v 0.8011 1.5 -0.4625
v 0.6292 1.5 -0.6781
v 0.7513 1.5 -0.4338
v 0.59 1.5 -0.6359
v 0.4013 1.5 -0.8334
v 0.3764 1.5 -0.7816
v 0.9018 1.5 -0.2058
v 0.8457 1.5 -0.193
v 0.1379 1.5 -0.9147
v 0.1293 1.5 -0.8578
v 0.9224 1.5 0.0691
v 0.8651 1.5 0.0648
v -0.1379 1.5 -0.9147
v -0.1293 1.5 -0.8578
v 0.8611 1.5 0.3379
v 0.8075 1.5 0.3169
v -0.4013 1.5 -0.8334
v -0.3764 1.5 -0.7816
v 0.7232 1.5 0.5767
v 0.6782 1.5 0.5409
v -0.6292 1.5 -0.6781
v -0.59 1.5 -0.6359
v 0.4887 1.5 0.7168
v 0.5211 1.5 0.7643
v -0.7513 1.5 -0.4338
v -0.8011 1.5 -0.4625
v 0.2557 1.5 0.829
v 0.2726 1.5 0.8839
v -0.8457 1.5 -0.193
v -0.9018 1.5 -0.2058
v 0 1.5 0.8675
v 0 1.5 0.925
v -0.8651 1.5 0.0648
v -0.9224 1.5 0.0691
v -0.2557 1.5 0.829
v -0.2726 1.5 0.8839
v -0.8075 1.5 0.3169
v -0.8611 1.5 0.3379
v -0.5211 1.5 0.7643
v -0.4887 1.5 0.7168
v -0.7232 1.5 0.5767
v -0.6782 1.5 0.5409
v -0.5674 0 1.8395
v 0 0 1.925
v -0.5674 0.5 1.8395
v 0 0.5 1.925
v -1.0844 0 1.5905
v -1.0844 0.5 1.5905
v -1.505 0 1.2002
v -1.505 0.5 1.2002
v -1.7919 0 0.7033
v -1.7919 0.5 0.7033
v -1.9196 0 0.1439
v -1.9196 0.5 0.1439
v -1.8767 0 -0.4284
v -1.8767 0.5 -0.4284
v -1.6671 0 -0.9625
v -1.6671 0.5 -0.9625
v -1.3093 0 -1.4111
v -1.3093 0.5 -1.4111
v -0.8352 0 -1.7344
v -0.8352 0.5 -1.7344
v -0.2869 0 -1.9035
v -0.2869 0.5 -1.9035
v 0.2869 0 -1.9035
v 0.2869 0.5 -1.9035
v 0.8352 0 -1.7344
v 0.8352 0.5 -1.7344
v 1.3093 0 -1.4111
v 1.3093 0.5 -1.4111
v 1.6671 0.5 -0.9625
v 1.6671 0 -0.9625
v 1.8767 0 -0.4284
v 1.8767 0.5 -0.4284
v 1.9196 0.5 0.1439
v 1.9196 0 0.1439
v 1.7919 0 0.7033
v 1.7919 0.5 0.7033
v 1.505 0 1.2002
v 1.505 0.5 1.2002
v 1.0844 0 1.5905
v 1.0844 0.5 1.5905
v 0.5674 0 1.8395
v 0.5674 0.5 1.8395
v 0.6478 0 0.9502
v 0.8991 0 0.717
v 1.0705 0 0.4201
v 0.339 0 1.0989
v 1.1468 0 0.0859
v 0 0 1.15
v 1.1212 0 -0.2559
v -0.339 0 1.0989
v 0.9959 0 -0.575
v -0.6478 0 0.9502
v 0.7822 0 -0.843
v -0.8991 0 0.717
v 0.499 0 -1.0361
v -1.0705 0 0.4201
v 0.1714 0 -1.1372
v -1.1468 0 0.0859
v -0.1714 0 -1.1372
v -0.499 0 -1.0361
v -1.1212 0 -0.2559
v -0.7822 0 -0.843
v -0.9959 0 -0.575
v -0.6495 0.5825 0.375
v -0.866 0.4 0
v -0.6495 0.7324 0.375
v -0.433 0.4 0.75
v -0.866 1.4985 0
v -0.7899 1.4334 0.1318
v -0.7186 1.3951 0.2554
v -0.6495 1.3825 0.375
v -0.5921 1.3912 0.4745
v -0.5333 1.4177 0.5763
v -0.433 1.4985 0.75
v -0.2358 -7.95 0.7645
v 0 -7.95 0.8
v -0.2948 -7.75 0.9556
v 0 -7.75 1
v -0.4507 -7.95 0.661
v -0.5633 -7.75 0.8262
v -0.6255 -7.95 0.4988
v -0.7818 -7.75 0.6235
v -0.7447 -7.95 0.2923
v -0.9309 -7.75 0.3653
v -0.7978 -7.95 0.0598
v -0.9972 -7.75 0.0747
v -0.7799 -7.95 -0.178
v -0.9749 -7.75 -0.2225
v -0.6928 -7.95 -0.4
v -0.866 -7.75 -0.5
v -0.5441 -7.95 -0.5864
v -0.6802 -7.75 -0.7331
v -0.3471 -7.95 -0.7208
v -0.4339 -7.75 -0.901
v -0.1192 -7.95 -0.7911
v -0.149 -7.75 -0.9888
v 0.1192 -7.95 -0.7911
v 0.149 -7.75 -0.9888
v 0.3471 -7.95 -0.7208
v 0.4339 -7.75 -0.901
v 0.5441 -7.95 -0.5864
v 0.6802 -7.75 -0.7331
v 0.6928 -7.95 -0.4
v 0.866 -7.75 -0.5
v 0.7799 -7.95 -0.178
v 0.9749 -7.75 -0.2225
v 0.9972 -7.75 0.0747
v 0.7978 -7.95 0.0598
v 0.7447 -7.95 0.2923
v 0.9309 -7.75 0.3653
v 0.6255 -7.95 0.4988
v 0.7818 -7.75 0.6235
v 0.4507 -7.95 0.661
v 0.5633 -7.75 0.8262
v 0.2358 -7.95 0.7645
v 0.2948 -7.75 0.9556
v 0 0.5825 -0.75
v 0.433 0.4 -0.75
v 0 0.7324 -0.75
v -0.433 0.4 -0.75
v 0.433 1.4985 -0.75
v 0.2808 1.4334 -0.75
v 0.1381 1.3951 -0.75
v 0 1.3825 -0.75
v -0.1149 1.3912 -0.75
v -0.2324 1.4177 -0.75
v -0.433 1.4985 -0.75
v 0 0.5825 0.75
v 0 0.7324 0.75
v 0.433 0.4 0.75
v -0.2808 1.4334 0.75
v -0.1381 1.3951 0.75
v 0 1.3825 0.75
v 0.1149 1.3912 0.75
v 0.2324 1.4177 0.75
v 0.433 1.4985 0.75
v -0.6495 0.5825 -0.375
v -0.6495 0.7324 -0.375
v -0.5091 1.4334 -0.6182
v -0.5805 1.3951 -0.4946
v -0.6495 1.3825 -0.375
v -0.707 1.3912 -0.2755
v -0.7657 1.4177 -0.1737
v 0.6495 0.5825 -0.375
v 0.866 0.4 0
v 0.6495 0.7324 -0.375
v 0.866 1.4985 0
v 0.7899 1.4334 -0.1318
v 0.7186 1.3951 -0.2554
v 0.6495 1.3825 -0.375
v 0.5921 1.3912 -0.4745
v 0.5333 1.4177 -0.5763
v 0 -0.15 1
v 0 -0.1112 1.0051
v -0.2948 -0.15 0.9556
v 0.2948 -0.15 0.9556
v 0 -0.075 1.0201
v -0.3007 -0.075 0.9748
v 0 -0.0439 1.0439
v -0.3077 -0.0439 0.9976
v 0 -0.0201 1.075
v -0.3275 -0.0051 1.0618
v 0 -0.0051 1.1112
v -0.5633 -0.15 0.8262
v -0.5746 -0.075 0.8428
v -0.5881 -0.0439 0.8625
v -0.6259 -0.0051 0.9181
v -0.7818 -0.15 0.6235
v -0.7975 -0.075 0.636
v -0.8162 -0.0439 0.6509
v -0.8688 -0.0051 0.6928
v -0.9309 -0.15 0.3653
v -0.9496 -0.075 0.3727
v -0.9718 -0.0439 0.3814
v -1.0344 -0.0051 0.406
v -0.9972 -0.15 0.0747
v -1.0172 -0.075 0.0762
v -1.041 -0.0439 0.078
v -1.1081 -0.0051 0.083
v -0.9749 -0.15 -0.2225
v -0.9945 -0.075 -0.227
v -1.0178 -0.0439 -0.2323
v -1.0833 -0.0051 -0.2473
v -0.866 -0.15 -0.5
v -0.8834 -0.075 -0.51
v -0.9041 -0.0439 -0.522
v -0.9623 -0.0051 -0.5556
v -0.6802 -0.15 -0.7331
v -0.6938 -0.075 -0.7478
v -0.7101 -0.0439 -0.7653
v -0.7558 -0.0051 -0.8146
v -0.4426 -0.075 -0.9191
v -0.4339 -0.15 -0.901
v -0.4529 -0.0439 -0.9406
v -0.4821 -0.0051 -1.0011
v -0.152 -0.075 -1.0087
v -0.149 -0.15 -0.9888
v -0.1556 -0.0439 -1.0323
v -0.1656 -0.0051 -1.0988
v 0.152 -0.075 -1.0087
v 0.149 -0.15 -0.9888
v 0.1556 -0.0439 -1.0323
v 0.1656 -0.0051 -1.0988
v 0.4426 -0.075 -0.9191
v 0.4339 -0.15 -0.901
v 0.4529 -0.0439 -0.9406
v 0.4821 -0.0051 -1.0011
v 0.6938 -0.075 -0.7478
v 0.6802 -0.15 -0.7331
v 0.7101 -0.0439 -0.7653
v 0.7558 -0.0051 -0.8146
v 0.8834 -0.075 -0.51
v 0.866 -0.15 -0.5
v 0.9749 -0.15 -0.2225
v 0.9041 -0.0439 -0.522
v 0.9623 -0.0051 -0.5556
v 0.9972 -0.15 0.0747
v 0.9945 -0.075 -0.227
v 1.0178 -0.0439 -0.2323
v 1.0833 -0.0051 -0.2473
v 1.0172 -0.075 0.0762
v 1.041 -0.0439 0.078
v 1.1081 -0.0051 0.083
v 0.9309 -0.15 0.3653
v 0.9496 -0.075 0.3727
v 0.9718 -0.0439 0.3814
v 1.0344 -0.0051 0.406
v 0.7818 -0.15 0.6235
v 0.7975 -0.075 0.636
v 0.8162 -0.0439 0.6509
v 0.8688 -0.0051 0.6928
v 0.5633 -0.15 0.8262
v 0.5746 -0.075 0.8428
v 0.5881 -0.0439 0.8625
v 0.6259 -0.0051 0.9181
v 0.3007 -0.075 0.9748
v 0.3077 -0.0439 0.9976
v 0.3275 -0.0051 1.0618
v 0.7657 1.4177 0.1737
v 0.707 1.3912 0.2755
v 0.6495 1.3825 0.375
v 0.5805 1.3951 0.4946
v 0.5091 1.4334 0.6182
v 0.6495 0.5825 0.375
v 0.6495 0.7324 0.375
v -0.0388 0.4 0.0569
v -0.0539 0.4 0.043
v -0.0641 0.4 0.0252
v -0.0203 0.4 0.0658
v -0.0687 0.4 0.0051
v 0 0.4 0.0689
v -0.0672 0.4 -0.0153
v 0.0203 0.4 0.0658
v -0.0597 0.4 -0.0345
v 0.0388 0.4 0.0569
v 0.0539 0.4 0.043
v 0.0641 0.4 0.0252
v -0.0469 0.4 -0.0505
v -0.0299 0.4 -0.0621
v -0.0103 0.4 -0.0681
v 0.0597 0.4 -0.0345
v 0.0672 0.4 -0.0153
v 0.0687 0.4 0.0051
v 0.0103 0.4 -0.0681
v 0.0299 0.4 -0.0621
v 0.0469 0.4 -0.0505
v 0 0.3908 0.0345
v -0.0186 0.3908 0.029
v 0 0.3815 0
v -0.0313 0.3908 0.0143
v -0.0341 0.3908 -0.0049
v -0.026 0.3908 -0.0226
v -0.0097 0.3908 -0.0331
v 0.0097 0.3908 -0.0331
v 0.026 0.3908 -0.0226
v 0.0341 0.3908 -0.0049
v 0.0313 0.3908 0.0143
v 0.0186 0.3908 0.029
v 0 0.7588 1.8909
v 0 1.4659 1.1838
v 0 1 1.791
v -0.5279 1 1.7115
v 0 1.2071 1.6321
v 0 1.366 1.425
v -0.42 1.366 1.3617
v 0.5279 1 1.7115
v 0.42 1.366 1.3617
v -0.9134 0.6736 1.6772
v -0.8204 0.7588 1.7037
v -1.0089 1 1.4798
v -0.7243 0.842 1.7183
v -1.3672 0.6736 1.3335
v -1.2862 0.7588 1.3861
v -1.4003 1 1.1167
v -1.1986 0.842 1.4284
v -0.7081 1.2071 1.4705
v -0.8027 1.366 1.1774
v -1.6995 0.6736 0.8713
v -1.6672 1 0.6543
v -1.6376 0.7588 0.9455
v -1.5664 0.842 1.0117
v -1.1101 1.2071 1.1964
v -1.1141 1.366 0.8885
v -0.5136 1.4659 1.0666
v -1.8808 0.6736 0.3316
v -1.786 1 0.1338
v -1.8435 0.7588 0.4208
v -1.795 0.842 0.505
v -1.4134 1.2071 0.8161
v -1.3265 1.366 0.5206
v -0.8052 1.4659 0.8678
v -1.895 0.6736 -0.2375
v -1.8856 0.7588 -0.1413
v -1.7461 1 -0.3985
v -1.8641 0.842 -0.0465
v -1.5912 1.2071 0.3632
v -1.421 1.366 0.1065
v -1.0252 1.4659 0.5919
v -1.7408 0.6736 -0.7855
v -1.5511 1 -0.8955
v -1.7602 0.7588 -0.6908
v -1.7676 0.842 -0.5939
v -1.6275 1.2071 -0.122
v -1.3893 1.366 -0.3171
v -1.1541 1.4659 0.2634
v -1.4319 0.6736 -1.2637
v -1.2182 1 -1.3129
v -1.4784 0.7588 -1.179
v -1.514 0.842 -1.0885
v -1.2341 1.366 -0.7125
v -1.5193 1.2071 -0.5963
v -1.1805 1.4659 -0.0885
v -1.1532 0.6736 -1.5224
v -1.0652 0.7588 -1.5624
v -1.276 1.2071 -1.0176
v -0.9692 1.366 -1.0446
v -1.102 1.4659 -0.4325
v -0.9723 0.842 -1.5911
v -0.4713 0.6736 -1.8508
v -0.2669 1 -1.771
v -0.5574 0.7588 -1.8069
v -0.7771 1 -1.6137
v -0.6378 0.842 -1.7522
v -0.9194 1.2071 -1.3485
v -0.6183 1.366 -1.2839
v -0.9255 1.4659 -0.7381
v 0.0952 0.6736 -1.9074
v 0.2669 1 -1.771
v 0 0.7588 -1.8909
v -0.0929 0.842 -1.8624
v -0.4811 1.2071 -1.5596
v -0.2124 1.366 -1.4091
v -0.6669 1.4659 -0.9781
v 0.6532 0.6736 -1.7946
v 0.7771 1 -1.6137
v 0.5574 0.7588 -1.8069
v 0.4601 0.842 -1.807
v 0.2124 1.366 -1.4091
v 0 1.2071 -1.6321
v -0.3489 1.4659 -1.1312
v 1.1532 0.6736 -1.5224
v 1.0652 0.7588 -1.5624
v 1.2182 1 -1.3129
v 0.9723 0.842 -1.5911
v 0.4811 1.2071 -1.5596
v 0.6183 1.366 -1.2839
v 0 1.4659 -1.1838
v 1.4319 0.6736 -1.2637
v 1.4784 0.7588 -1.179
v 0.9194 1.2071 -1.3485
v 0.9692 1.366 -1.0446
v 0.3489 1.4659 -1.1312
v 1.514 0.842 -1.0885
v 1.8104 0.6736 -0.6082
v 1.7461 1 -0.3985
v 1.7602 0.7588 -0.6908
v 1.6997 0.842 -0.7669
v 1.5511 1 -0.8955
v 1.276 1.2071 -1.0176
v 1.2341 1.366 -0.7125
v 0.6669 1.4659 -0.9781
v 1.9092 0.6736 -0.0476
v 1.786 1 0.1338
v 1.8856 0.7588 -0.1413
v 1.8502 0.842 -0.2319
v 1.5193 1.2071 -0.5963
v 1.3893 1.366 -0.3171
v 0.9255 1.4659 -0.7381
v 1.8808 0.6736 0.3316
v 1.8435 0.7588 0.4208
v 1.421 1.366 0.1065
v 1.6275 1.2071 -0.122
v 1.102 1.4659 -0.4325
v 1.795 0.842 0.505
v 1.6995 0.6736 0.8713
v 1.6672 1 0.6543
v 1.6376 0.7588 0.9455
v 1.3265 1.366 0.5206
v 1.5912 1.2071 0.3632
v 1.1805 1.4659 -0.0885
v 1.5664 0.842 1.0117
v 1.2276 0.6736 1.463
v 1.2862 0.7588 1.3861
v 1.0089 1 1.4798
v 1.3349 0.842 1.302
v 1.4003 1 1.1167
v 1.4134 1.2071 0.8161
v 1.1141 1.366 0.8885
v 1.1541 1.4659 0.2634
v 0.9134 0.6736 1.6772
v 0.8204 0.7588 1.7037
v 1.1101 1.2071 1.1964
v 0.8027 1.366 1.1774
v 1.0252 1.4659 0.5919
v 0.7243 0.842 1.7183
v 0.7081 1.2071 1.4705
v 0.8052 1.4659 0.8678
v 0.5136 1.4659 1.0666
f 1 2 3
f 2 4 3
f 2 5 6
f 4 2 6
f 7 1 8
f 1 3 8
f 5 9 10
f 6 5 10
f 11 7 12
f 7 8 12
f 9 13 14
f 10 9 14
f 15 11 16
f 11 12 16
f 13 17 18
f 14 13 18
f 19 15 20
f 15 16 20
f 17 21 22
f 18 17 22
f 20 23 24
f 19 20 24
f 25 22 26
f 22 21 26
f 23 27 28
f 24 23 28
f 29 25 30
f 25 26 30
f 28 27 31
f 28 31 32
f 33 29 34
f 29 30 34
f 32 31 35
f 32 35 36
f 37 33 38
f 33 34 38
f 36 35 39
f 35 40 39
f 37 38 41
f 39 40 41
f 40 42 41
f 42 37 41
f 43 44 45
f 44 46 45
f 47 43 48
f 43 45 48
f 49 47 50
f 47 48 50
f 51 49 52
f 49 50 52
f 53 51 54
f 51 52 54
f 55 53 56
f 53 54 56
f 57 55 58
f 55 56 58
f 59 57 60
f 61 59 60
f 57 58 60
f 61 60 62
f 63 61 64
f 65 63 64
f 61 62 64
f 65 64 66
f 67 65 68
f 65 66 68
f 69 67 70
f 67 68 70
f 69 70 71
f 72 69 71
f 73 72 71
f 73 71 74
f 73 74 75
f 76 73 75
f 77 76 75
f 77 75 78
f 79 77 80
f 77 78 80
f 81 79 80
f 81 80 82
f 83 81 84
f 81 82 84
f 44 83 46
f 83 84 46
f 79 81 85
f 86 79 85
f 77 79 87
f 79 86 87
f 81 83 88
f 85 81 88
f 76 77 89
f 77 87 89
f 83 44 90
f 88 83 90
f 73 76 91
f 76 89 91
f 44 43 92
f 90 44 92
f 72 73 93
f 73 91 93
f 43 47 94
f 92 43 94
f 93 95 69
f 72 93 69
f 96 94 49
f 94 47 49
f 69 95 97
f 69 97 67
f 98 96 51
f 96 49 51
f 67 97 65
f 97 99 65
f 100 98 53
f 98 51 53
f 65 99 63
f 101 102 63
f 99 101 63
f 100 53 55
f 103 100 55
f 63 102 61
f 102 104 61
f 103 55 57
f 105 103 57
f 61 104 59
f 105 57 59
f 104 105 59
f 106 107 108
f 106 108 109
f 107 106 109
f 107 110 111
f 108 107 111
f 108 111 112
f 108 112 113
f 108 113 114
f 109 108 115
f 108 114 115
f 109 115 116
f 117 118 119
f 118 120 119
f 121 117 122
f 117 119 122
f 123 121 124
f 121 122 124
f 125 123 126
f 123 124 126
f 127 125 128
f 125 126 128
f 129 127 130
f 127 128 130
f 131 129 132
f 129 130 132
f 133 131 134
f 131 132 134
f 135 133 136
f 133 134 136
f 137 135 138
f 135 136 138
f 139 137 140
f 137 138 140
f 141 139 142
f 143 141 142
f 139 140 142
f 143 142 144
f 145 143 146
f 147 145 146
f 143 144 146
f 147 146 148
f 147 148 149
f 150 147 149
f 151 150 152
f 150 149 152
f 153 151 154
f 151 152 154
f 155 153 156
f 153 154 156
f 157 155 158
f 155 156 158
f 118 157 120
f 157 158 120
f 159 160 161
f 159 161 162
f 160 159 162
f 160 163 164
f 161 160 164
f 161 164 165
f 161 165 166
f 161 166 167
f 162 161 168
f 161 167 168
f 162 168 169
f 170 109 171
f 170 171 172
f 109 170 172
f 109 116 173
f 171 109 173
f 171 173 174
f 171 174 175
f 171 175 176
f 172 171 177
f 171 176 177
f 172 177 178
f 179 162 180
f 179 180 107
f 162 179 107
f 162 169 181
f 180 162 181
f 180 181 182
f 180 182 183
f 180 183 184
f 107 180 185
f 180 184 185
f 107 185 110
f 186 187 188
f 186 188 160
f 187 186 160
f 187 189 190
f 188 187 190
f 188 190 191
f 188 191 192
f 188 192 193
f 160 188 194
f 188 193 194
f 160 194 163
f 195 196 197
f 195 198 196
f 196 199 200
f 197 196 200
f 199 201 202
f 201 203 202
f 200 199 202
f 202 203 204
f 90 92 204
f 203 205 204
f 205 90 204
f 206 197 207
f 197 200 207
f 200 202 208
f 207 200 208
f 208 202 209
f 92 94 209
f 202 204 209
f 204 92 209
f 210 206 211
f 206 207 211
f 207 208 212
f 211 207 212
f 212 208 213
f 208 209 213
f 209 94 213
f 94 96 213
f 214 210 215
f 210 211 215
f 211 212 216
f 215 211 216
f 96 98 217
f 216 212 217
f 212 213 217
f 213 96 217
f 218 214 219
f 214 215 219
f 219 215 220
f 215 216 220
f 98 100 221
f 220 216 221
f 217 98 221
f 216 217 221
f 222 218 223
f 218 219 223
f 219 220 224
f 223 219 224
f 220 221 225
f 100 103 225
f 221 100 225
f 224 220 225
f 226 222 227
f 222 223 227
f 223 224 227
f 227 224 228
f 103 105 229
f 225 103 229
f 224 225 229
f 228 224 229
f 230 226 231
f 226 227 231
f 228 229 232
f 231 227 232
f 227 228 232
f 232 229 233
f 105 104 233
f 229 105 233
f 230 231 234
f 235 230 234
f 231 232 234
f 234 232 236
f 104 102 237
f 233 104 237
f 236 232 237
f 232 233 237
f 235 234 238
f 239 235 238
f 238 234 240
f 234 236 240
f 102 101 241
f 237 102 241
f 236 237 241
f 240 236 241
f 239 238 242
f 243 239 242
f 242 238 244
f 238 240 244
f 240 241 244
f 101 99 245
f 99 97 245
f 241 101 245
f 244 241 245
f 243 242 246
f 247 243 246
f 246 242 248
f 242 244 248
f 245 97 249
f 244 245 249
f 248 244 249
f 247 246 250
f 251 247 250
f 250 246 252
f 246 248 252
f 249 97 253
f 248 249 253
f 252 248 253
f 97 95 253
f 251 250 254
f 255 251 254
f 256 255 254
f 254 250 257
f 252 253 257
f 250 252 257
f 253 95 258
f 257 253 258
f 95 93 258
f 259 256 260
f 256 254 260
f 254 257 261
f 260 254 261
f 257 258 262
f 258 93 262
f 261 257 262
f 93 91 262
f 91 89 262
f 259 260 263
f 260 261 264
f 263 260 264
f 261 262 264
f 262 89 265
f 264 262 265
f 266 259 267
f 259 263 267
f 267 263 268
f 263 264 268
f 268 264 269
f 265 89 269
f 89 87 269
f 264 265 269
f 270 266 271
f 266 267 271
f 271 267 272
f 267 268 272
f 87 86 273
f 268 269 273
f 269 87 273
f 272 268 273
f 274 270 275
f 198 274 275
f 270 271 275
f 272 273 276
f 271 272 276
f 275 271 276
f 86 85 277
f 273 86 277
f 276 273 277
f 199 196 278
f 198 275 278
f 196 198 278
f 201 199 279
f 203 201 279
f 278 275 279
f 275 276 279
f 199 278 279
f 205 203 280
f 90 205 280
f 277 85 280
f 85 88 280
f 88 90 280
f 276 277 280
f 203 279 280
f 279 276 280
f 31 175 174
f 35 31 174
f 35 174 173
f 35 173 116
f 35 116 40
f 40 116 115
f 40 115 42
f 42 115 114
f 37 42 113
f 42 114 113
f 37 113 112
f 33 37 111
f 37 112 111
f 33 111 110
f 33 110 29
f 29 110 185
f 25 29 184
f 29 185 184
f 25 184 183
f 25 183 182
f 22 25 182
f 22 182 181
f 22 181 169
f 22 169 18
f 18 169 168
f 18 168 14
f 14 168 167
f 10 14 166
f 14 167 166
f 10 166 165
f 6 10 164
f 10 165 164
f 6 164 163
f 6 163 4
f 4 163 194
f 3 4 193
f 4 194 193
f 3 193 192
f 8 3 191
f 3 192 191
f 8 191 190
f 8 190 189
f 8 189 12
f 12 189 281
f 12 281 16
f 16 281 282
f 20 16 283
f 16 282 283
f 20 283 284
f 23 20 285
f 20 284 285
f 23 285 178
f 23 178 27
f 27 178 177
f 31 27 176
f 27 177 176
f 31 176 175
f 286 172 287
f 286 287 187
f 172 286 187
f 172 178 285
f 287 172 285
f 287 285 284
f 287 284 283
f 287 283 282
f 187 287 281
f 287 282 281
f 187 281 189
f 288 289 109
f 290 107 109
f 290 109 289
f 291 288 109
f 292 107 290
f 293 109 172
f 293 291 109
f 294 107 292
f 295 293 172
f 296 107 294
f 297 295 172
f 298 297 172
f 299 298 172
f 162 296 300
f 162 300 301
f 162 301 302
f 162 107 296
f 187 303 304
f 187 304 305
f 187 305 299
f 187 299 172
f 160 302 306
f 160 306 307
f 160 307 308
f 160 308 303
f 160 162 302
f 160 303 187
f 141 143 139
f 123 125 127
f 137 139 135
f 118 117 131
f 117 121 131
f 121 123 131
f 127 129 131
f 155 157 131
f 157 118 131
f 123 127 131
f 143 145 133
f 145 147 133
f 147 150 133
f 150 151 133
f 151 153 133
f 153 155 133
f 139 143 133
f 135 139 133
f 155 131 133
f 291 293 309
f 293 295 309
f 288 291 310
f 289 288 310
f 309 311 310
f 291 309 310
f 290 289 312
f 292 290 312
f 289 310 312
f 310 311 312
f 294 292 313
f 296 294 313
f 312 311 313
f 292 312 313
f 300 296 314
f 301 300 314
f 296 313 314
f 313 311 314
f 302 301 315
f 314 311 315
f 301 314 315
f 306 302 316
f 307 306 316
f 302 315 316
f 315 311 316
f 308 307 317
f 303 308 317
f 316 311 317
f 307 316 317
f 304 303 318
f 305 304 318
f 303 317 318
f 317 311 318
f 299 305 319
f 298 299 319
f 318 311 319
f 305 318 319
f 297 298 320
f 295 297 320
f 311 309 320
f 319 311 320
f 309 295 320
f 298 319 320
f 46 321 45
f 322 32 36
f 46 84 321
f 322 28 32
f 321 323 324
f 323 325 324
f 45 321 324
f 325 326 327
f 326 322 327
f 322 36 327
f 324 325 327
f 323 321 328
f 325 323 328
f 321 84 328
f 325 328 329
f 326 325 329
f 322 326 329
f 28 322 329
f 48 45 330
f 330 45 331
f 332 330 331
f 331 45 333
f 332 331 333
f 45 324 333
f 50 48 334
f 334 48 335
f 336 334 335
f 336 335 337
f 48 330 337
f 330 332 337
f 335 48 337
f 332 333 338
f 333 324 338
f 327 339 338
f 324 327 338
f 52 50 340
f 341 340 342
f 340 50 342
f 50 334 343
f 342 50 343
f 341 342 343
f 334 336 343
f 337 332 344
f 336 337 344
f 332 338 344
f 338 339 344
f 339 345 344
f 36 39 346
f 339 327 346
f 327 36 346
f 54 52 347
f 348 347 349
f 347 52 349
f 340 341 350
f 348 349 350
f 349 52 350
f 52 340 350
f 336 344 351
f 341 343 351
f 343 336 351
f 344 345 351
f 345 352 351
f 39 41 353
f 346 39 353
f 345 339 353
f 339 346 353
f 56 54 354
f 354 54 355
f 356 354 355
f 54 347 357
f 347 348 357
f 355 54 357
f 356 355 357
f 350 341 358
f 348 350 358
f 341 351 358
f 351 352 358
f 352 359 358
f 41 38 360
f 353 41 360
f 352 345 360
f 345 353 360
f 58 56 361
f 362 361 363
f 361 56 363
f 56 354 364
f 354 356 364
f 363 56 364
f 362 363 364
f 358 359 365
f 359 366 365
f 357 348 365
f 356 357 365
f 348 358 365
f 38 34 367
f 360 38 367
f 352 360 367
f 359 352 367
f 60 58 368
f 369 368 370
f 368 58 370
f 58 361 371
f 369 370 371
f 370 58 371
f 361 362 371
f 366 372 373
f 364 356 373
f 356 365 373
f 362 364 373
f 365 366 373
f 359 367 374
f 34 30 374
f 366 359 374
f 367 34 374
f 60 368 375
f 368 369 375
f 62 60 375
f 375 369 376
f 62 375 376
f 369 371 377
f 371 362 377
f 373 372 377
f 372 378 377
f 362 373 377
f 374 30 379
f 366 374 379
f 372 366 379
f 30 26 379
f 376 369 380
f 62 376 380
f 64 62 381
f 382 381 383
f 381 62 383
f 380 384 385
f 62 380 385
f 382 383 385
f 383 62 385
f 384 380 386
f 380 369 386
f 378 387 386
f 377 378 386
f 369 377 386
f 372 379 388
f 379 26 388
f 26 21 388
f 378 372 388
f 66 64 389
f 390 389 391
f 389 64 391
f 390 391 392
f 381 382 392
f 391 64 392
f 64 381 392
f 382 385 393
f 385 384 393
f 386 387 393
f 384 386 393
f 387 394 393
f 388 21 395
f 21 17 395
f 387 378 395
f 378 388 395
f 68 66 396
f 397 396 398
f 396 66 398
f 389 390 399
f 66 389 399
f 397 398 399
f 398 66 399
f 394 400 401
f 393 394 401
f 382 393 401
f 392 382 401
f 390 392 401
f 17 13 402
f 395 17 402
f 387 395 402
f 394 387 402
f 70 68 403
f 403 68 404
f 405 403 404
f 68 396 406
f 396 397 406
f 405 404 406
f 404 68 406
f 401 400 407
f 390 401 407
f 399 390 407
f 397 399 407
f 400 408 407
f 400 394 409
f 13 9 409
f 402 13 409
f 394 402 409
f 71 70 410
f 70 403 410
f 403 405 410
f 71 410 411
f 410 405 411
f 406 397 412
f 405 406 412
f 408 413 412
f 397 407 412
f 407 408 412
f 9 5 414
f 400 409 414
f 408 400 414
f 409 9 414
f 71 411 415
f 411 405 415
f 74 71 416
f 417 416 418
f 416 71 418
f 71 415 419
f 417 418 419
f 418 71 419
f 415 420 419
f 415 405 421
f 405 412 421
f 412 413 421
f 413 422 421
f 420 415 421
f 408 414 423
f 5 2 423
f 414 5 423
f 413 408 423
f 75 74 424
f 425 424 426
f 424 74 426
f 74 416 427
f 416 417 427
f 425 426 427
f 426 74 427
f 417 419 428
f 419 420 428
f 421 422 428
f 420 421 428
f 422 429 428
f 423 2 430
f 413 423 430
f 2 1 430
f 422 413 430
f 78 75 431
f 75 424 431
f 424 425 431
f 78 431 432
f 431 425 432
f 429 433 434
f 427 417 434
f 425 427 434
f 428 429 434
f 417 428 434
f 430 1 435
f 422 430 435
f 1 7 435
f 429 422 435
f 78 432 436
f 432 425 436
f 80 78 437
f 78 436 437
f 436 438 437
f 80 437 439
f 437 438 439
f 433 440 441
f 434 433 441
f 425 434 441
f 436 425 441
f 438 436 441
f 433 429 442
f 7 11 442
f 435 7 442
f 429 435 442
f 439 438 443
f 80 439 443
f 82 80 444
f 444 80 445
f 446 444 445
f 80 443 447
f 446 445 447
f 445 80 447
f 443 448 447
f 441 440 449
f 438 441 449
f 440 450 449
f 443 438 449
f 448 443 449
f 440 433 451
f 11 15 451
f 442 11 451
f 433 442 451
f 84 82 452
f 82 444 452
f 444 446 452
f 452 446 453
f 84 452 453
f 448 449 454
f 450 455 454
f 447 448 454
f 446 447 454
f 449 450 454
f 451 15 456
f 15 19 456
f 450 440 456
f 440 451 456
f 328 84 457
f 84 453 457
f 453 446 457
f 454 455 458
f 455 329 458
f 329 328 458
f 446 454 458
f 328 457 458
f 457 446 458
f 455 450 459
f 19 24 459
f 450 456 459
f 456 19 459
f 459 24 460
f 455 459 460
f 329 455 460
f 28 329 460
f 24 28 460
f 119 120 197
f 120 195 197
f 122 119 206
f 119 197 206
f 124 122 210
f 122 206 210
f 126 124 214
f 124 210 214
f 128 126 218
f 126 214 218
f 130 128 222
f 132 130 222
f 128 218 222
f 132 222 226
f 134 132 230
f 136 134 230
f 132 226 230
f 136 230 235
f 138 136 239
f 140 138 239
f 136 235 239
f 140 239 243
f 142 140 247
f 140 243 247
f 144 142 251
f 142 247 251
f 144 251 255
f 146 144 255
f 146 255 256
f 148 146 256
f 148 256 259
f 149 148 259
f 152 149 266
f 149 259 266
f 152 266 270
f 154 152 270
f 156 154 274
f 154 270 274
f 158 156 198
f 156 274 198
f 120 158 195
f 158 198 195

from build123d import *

# Parameters (mm, degrees)
CUT_EXTRUDE1_DEPTH  = 1.1
BOSS_EXTRUDE1_REACH = 12.334
BOSS_EXTRUDE1_START = -0.5
SKETCH2_3_R         = 1.309481769


with BuildPart() as part:
    # Sketch1 → Revolve1 (revolve)
    with BuildSketch(Plane(origin=(0, 0, 0), x_dir=(0, 0, -1), z_dir=(1, 0, 0))):
        with BuildLine():
            Line((0, -7.95), (0.8, -7.95))
            Line((0.8, -7.95), (1, -7.75))
            Line((1, -7.75), (1, -0.15))
            ThreePointArc((1, -0.15), (1.043933983, -0.043933983), (1.15, 0))
            Line((1.15, 0), (1.925, 0))
            Line((1.925, 0), (1.925, 0.5))
            ThreePointArc((1.925, 0.5), (1.632106781, 1.207106781), (0.925, 1.5))
            Line((0.925, 1.5), (0.8675, 1.5))
            Line((0.8675, 1.5), (0.75, 1.3825))
            Line((0.75, 1.3825), (0.75, 0.5825))
            Line((0.75, 0.5825), (0, 0.381538106))
            Line((0, 0.381538106), (0, -7.95))
        make_face()
    revolve(axis=Axis((0, 2.837665271, 0), (0, -1, 0)))

    # Sketch2 → Cut-Extrude1 (cut)
    with BuildSketch(Plane(origin=(0, 1.5, 0), x_dir=(1, 0, 0), z_dir=(0, 1, 0))):
        Polygon((-0.433012702, -0.75), (0.433012702, -0.75), (0.866025404, 0), (0.433012702, 0.75), (-0.433012702, 0.75), (-0.866025404, 0), align=None)
    extrude(amount=-CUT_EXTRUDE1_DEPTH, mode=Mode.SUBTRACT)

    # Boss-Extrude1: up to this cone (the profile starts inside it)
    boss_extrude1_end = Plane(origin=(0, 1, 0), z_dir=(0, 1, 0)).offset(-0.618460894) * Cone(3.732e-06, 58.819334231, 15.760592106, align=(Align.CENTER, Align.CENTER, Align.MIN), mode=Mode.PRIVATE)
    # Sketch2<3> → Boss-Extrude1 (add, up to the surface)
    with BuildSketch(Plane(origin=(0, 1.5, 0), x_dir=(1, 0, 0), z_dir=(0, 1, 0)).offset(BOSS_EXTRUDE1_START), mode=Mode.PRIVATE) as boss_extrude1_sk1:
        Circle(SKETCH2_3_R)
        Polygon((0.433012702, -0.75), (0.866025404, 0), (0.433012702, 0.75), (-0.433012702, 0.75), (-0.866025404, 0), (-0.433012702, -0.75), align=None, mode=Mode.SUBTRACT)
    boss_extrude1_tool1 = extrude(boss_extrude1_sk1.sketch, amount=-BOSS_EXTRUDE1_REACH, mode=Mode.PRIVATE) & boss_extrude1_end
    add(boss_extrude1_tool1.solids().sort_by_distance((-1.272444, 1, 0))[0])


solid = part.part
